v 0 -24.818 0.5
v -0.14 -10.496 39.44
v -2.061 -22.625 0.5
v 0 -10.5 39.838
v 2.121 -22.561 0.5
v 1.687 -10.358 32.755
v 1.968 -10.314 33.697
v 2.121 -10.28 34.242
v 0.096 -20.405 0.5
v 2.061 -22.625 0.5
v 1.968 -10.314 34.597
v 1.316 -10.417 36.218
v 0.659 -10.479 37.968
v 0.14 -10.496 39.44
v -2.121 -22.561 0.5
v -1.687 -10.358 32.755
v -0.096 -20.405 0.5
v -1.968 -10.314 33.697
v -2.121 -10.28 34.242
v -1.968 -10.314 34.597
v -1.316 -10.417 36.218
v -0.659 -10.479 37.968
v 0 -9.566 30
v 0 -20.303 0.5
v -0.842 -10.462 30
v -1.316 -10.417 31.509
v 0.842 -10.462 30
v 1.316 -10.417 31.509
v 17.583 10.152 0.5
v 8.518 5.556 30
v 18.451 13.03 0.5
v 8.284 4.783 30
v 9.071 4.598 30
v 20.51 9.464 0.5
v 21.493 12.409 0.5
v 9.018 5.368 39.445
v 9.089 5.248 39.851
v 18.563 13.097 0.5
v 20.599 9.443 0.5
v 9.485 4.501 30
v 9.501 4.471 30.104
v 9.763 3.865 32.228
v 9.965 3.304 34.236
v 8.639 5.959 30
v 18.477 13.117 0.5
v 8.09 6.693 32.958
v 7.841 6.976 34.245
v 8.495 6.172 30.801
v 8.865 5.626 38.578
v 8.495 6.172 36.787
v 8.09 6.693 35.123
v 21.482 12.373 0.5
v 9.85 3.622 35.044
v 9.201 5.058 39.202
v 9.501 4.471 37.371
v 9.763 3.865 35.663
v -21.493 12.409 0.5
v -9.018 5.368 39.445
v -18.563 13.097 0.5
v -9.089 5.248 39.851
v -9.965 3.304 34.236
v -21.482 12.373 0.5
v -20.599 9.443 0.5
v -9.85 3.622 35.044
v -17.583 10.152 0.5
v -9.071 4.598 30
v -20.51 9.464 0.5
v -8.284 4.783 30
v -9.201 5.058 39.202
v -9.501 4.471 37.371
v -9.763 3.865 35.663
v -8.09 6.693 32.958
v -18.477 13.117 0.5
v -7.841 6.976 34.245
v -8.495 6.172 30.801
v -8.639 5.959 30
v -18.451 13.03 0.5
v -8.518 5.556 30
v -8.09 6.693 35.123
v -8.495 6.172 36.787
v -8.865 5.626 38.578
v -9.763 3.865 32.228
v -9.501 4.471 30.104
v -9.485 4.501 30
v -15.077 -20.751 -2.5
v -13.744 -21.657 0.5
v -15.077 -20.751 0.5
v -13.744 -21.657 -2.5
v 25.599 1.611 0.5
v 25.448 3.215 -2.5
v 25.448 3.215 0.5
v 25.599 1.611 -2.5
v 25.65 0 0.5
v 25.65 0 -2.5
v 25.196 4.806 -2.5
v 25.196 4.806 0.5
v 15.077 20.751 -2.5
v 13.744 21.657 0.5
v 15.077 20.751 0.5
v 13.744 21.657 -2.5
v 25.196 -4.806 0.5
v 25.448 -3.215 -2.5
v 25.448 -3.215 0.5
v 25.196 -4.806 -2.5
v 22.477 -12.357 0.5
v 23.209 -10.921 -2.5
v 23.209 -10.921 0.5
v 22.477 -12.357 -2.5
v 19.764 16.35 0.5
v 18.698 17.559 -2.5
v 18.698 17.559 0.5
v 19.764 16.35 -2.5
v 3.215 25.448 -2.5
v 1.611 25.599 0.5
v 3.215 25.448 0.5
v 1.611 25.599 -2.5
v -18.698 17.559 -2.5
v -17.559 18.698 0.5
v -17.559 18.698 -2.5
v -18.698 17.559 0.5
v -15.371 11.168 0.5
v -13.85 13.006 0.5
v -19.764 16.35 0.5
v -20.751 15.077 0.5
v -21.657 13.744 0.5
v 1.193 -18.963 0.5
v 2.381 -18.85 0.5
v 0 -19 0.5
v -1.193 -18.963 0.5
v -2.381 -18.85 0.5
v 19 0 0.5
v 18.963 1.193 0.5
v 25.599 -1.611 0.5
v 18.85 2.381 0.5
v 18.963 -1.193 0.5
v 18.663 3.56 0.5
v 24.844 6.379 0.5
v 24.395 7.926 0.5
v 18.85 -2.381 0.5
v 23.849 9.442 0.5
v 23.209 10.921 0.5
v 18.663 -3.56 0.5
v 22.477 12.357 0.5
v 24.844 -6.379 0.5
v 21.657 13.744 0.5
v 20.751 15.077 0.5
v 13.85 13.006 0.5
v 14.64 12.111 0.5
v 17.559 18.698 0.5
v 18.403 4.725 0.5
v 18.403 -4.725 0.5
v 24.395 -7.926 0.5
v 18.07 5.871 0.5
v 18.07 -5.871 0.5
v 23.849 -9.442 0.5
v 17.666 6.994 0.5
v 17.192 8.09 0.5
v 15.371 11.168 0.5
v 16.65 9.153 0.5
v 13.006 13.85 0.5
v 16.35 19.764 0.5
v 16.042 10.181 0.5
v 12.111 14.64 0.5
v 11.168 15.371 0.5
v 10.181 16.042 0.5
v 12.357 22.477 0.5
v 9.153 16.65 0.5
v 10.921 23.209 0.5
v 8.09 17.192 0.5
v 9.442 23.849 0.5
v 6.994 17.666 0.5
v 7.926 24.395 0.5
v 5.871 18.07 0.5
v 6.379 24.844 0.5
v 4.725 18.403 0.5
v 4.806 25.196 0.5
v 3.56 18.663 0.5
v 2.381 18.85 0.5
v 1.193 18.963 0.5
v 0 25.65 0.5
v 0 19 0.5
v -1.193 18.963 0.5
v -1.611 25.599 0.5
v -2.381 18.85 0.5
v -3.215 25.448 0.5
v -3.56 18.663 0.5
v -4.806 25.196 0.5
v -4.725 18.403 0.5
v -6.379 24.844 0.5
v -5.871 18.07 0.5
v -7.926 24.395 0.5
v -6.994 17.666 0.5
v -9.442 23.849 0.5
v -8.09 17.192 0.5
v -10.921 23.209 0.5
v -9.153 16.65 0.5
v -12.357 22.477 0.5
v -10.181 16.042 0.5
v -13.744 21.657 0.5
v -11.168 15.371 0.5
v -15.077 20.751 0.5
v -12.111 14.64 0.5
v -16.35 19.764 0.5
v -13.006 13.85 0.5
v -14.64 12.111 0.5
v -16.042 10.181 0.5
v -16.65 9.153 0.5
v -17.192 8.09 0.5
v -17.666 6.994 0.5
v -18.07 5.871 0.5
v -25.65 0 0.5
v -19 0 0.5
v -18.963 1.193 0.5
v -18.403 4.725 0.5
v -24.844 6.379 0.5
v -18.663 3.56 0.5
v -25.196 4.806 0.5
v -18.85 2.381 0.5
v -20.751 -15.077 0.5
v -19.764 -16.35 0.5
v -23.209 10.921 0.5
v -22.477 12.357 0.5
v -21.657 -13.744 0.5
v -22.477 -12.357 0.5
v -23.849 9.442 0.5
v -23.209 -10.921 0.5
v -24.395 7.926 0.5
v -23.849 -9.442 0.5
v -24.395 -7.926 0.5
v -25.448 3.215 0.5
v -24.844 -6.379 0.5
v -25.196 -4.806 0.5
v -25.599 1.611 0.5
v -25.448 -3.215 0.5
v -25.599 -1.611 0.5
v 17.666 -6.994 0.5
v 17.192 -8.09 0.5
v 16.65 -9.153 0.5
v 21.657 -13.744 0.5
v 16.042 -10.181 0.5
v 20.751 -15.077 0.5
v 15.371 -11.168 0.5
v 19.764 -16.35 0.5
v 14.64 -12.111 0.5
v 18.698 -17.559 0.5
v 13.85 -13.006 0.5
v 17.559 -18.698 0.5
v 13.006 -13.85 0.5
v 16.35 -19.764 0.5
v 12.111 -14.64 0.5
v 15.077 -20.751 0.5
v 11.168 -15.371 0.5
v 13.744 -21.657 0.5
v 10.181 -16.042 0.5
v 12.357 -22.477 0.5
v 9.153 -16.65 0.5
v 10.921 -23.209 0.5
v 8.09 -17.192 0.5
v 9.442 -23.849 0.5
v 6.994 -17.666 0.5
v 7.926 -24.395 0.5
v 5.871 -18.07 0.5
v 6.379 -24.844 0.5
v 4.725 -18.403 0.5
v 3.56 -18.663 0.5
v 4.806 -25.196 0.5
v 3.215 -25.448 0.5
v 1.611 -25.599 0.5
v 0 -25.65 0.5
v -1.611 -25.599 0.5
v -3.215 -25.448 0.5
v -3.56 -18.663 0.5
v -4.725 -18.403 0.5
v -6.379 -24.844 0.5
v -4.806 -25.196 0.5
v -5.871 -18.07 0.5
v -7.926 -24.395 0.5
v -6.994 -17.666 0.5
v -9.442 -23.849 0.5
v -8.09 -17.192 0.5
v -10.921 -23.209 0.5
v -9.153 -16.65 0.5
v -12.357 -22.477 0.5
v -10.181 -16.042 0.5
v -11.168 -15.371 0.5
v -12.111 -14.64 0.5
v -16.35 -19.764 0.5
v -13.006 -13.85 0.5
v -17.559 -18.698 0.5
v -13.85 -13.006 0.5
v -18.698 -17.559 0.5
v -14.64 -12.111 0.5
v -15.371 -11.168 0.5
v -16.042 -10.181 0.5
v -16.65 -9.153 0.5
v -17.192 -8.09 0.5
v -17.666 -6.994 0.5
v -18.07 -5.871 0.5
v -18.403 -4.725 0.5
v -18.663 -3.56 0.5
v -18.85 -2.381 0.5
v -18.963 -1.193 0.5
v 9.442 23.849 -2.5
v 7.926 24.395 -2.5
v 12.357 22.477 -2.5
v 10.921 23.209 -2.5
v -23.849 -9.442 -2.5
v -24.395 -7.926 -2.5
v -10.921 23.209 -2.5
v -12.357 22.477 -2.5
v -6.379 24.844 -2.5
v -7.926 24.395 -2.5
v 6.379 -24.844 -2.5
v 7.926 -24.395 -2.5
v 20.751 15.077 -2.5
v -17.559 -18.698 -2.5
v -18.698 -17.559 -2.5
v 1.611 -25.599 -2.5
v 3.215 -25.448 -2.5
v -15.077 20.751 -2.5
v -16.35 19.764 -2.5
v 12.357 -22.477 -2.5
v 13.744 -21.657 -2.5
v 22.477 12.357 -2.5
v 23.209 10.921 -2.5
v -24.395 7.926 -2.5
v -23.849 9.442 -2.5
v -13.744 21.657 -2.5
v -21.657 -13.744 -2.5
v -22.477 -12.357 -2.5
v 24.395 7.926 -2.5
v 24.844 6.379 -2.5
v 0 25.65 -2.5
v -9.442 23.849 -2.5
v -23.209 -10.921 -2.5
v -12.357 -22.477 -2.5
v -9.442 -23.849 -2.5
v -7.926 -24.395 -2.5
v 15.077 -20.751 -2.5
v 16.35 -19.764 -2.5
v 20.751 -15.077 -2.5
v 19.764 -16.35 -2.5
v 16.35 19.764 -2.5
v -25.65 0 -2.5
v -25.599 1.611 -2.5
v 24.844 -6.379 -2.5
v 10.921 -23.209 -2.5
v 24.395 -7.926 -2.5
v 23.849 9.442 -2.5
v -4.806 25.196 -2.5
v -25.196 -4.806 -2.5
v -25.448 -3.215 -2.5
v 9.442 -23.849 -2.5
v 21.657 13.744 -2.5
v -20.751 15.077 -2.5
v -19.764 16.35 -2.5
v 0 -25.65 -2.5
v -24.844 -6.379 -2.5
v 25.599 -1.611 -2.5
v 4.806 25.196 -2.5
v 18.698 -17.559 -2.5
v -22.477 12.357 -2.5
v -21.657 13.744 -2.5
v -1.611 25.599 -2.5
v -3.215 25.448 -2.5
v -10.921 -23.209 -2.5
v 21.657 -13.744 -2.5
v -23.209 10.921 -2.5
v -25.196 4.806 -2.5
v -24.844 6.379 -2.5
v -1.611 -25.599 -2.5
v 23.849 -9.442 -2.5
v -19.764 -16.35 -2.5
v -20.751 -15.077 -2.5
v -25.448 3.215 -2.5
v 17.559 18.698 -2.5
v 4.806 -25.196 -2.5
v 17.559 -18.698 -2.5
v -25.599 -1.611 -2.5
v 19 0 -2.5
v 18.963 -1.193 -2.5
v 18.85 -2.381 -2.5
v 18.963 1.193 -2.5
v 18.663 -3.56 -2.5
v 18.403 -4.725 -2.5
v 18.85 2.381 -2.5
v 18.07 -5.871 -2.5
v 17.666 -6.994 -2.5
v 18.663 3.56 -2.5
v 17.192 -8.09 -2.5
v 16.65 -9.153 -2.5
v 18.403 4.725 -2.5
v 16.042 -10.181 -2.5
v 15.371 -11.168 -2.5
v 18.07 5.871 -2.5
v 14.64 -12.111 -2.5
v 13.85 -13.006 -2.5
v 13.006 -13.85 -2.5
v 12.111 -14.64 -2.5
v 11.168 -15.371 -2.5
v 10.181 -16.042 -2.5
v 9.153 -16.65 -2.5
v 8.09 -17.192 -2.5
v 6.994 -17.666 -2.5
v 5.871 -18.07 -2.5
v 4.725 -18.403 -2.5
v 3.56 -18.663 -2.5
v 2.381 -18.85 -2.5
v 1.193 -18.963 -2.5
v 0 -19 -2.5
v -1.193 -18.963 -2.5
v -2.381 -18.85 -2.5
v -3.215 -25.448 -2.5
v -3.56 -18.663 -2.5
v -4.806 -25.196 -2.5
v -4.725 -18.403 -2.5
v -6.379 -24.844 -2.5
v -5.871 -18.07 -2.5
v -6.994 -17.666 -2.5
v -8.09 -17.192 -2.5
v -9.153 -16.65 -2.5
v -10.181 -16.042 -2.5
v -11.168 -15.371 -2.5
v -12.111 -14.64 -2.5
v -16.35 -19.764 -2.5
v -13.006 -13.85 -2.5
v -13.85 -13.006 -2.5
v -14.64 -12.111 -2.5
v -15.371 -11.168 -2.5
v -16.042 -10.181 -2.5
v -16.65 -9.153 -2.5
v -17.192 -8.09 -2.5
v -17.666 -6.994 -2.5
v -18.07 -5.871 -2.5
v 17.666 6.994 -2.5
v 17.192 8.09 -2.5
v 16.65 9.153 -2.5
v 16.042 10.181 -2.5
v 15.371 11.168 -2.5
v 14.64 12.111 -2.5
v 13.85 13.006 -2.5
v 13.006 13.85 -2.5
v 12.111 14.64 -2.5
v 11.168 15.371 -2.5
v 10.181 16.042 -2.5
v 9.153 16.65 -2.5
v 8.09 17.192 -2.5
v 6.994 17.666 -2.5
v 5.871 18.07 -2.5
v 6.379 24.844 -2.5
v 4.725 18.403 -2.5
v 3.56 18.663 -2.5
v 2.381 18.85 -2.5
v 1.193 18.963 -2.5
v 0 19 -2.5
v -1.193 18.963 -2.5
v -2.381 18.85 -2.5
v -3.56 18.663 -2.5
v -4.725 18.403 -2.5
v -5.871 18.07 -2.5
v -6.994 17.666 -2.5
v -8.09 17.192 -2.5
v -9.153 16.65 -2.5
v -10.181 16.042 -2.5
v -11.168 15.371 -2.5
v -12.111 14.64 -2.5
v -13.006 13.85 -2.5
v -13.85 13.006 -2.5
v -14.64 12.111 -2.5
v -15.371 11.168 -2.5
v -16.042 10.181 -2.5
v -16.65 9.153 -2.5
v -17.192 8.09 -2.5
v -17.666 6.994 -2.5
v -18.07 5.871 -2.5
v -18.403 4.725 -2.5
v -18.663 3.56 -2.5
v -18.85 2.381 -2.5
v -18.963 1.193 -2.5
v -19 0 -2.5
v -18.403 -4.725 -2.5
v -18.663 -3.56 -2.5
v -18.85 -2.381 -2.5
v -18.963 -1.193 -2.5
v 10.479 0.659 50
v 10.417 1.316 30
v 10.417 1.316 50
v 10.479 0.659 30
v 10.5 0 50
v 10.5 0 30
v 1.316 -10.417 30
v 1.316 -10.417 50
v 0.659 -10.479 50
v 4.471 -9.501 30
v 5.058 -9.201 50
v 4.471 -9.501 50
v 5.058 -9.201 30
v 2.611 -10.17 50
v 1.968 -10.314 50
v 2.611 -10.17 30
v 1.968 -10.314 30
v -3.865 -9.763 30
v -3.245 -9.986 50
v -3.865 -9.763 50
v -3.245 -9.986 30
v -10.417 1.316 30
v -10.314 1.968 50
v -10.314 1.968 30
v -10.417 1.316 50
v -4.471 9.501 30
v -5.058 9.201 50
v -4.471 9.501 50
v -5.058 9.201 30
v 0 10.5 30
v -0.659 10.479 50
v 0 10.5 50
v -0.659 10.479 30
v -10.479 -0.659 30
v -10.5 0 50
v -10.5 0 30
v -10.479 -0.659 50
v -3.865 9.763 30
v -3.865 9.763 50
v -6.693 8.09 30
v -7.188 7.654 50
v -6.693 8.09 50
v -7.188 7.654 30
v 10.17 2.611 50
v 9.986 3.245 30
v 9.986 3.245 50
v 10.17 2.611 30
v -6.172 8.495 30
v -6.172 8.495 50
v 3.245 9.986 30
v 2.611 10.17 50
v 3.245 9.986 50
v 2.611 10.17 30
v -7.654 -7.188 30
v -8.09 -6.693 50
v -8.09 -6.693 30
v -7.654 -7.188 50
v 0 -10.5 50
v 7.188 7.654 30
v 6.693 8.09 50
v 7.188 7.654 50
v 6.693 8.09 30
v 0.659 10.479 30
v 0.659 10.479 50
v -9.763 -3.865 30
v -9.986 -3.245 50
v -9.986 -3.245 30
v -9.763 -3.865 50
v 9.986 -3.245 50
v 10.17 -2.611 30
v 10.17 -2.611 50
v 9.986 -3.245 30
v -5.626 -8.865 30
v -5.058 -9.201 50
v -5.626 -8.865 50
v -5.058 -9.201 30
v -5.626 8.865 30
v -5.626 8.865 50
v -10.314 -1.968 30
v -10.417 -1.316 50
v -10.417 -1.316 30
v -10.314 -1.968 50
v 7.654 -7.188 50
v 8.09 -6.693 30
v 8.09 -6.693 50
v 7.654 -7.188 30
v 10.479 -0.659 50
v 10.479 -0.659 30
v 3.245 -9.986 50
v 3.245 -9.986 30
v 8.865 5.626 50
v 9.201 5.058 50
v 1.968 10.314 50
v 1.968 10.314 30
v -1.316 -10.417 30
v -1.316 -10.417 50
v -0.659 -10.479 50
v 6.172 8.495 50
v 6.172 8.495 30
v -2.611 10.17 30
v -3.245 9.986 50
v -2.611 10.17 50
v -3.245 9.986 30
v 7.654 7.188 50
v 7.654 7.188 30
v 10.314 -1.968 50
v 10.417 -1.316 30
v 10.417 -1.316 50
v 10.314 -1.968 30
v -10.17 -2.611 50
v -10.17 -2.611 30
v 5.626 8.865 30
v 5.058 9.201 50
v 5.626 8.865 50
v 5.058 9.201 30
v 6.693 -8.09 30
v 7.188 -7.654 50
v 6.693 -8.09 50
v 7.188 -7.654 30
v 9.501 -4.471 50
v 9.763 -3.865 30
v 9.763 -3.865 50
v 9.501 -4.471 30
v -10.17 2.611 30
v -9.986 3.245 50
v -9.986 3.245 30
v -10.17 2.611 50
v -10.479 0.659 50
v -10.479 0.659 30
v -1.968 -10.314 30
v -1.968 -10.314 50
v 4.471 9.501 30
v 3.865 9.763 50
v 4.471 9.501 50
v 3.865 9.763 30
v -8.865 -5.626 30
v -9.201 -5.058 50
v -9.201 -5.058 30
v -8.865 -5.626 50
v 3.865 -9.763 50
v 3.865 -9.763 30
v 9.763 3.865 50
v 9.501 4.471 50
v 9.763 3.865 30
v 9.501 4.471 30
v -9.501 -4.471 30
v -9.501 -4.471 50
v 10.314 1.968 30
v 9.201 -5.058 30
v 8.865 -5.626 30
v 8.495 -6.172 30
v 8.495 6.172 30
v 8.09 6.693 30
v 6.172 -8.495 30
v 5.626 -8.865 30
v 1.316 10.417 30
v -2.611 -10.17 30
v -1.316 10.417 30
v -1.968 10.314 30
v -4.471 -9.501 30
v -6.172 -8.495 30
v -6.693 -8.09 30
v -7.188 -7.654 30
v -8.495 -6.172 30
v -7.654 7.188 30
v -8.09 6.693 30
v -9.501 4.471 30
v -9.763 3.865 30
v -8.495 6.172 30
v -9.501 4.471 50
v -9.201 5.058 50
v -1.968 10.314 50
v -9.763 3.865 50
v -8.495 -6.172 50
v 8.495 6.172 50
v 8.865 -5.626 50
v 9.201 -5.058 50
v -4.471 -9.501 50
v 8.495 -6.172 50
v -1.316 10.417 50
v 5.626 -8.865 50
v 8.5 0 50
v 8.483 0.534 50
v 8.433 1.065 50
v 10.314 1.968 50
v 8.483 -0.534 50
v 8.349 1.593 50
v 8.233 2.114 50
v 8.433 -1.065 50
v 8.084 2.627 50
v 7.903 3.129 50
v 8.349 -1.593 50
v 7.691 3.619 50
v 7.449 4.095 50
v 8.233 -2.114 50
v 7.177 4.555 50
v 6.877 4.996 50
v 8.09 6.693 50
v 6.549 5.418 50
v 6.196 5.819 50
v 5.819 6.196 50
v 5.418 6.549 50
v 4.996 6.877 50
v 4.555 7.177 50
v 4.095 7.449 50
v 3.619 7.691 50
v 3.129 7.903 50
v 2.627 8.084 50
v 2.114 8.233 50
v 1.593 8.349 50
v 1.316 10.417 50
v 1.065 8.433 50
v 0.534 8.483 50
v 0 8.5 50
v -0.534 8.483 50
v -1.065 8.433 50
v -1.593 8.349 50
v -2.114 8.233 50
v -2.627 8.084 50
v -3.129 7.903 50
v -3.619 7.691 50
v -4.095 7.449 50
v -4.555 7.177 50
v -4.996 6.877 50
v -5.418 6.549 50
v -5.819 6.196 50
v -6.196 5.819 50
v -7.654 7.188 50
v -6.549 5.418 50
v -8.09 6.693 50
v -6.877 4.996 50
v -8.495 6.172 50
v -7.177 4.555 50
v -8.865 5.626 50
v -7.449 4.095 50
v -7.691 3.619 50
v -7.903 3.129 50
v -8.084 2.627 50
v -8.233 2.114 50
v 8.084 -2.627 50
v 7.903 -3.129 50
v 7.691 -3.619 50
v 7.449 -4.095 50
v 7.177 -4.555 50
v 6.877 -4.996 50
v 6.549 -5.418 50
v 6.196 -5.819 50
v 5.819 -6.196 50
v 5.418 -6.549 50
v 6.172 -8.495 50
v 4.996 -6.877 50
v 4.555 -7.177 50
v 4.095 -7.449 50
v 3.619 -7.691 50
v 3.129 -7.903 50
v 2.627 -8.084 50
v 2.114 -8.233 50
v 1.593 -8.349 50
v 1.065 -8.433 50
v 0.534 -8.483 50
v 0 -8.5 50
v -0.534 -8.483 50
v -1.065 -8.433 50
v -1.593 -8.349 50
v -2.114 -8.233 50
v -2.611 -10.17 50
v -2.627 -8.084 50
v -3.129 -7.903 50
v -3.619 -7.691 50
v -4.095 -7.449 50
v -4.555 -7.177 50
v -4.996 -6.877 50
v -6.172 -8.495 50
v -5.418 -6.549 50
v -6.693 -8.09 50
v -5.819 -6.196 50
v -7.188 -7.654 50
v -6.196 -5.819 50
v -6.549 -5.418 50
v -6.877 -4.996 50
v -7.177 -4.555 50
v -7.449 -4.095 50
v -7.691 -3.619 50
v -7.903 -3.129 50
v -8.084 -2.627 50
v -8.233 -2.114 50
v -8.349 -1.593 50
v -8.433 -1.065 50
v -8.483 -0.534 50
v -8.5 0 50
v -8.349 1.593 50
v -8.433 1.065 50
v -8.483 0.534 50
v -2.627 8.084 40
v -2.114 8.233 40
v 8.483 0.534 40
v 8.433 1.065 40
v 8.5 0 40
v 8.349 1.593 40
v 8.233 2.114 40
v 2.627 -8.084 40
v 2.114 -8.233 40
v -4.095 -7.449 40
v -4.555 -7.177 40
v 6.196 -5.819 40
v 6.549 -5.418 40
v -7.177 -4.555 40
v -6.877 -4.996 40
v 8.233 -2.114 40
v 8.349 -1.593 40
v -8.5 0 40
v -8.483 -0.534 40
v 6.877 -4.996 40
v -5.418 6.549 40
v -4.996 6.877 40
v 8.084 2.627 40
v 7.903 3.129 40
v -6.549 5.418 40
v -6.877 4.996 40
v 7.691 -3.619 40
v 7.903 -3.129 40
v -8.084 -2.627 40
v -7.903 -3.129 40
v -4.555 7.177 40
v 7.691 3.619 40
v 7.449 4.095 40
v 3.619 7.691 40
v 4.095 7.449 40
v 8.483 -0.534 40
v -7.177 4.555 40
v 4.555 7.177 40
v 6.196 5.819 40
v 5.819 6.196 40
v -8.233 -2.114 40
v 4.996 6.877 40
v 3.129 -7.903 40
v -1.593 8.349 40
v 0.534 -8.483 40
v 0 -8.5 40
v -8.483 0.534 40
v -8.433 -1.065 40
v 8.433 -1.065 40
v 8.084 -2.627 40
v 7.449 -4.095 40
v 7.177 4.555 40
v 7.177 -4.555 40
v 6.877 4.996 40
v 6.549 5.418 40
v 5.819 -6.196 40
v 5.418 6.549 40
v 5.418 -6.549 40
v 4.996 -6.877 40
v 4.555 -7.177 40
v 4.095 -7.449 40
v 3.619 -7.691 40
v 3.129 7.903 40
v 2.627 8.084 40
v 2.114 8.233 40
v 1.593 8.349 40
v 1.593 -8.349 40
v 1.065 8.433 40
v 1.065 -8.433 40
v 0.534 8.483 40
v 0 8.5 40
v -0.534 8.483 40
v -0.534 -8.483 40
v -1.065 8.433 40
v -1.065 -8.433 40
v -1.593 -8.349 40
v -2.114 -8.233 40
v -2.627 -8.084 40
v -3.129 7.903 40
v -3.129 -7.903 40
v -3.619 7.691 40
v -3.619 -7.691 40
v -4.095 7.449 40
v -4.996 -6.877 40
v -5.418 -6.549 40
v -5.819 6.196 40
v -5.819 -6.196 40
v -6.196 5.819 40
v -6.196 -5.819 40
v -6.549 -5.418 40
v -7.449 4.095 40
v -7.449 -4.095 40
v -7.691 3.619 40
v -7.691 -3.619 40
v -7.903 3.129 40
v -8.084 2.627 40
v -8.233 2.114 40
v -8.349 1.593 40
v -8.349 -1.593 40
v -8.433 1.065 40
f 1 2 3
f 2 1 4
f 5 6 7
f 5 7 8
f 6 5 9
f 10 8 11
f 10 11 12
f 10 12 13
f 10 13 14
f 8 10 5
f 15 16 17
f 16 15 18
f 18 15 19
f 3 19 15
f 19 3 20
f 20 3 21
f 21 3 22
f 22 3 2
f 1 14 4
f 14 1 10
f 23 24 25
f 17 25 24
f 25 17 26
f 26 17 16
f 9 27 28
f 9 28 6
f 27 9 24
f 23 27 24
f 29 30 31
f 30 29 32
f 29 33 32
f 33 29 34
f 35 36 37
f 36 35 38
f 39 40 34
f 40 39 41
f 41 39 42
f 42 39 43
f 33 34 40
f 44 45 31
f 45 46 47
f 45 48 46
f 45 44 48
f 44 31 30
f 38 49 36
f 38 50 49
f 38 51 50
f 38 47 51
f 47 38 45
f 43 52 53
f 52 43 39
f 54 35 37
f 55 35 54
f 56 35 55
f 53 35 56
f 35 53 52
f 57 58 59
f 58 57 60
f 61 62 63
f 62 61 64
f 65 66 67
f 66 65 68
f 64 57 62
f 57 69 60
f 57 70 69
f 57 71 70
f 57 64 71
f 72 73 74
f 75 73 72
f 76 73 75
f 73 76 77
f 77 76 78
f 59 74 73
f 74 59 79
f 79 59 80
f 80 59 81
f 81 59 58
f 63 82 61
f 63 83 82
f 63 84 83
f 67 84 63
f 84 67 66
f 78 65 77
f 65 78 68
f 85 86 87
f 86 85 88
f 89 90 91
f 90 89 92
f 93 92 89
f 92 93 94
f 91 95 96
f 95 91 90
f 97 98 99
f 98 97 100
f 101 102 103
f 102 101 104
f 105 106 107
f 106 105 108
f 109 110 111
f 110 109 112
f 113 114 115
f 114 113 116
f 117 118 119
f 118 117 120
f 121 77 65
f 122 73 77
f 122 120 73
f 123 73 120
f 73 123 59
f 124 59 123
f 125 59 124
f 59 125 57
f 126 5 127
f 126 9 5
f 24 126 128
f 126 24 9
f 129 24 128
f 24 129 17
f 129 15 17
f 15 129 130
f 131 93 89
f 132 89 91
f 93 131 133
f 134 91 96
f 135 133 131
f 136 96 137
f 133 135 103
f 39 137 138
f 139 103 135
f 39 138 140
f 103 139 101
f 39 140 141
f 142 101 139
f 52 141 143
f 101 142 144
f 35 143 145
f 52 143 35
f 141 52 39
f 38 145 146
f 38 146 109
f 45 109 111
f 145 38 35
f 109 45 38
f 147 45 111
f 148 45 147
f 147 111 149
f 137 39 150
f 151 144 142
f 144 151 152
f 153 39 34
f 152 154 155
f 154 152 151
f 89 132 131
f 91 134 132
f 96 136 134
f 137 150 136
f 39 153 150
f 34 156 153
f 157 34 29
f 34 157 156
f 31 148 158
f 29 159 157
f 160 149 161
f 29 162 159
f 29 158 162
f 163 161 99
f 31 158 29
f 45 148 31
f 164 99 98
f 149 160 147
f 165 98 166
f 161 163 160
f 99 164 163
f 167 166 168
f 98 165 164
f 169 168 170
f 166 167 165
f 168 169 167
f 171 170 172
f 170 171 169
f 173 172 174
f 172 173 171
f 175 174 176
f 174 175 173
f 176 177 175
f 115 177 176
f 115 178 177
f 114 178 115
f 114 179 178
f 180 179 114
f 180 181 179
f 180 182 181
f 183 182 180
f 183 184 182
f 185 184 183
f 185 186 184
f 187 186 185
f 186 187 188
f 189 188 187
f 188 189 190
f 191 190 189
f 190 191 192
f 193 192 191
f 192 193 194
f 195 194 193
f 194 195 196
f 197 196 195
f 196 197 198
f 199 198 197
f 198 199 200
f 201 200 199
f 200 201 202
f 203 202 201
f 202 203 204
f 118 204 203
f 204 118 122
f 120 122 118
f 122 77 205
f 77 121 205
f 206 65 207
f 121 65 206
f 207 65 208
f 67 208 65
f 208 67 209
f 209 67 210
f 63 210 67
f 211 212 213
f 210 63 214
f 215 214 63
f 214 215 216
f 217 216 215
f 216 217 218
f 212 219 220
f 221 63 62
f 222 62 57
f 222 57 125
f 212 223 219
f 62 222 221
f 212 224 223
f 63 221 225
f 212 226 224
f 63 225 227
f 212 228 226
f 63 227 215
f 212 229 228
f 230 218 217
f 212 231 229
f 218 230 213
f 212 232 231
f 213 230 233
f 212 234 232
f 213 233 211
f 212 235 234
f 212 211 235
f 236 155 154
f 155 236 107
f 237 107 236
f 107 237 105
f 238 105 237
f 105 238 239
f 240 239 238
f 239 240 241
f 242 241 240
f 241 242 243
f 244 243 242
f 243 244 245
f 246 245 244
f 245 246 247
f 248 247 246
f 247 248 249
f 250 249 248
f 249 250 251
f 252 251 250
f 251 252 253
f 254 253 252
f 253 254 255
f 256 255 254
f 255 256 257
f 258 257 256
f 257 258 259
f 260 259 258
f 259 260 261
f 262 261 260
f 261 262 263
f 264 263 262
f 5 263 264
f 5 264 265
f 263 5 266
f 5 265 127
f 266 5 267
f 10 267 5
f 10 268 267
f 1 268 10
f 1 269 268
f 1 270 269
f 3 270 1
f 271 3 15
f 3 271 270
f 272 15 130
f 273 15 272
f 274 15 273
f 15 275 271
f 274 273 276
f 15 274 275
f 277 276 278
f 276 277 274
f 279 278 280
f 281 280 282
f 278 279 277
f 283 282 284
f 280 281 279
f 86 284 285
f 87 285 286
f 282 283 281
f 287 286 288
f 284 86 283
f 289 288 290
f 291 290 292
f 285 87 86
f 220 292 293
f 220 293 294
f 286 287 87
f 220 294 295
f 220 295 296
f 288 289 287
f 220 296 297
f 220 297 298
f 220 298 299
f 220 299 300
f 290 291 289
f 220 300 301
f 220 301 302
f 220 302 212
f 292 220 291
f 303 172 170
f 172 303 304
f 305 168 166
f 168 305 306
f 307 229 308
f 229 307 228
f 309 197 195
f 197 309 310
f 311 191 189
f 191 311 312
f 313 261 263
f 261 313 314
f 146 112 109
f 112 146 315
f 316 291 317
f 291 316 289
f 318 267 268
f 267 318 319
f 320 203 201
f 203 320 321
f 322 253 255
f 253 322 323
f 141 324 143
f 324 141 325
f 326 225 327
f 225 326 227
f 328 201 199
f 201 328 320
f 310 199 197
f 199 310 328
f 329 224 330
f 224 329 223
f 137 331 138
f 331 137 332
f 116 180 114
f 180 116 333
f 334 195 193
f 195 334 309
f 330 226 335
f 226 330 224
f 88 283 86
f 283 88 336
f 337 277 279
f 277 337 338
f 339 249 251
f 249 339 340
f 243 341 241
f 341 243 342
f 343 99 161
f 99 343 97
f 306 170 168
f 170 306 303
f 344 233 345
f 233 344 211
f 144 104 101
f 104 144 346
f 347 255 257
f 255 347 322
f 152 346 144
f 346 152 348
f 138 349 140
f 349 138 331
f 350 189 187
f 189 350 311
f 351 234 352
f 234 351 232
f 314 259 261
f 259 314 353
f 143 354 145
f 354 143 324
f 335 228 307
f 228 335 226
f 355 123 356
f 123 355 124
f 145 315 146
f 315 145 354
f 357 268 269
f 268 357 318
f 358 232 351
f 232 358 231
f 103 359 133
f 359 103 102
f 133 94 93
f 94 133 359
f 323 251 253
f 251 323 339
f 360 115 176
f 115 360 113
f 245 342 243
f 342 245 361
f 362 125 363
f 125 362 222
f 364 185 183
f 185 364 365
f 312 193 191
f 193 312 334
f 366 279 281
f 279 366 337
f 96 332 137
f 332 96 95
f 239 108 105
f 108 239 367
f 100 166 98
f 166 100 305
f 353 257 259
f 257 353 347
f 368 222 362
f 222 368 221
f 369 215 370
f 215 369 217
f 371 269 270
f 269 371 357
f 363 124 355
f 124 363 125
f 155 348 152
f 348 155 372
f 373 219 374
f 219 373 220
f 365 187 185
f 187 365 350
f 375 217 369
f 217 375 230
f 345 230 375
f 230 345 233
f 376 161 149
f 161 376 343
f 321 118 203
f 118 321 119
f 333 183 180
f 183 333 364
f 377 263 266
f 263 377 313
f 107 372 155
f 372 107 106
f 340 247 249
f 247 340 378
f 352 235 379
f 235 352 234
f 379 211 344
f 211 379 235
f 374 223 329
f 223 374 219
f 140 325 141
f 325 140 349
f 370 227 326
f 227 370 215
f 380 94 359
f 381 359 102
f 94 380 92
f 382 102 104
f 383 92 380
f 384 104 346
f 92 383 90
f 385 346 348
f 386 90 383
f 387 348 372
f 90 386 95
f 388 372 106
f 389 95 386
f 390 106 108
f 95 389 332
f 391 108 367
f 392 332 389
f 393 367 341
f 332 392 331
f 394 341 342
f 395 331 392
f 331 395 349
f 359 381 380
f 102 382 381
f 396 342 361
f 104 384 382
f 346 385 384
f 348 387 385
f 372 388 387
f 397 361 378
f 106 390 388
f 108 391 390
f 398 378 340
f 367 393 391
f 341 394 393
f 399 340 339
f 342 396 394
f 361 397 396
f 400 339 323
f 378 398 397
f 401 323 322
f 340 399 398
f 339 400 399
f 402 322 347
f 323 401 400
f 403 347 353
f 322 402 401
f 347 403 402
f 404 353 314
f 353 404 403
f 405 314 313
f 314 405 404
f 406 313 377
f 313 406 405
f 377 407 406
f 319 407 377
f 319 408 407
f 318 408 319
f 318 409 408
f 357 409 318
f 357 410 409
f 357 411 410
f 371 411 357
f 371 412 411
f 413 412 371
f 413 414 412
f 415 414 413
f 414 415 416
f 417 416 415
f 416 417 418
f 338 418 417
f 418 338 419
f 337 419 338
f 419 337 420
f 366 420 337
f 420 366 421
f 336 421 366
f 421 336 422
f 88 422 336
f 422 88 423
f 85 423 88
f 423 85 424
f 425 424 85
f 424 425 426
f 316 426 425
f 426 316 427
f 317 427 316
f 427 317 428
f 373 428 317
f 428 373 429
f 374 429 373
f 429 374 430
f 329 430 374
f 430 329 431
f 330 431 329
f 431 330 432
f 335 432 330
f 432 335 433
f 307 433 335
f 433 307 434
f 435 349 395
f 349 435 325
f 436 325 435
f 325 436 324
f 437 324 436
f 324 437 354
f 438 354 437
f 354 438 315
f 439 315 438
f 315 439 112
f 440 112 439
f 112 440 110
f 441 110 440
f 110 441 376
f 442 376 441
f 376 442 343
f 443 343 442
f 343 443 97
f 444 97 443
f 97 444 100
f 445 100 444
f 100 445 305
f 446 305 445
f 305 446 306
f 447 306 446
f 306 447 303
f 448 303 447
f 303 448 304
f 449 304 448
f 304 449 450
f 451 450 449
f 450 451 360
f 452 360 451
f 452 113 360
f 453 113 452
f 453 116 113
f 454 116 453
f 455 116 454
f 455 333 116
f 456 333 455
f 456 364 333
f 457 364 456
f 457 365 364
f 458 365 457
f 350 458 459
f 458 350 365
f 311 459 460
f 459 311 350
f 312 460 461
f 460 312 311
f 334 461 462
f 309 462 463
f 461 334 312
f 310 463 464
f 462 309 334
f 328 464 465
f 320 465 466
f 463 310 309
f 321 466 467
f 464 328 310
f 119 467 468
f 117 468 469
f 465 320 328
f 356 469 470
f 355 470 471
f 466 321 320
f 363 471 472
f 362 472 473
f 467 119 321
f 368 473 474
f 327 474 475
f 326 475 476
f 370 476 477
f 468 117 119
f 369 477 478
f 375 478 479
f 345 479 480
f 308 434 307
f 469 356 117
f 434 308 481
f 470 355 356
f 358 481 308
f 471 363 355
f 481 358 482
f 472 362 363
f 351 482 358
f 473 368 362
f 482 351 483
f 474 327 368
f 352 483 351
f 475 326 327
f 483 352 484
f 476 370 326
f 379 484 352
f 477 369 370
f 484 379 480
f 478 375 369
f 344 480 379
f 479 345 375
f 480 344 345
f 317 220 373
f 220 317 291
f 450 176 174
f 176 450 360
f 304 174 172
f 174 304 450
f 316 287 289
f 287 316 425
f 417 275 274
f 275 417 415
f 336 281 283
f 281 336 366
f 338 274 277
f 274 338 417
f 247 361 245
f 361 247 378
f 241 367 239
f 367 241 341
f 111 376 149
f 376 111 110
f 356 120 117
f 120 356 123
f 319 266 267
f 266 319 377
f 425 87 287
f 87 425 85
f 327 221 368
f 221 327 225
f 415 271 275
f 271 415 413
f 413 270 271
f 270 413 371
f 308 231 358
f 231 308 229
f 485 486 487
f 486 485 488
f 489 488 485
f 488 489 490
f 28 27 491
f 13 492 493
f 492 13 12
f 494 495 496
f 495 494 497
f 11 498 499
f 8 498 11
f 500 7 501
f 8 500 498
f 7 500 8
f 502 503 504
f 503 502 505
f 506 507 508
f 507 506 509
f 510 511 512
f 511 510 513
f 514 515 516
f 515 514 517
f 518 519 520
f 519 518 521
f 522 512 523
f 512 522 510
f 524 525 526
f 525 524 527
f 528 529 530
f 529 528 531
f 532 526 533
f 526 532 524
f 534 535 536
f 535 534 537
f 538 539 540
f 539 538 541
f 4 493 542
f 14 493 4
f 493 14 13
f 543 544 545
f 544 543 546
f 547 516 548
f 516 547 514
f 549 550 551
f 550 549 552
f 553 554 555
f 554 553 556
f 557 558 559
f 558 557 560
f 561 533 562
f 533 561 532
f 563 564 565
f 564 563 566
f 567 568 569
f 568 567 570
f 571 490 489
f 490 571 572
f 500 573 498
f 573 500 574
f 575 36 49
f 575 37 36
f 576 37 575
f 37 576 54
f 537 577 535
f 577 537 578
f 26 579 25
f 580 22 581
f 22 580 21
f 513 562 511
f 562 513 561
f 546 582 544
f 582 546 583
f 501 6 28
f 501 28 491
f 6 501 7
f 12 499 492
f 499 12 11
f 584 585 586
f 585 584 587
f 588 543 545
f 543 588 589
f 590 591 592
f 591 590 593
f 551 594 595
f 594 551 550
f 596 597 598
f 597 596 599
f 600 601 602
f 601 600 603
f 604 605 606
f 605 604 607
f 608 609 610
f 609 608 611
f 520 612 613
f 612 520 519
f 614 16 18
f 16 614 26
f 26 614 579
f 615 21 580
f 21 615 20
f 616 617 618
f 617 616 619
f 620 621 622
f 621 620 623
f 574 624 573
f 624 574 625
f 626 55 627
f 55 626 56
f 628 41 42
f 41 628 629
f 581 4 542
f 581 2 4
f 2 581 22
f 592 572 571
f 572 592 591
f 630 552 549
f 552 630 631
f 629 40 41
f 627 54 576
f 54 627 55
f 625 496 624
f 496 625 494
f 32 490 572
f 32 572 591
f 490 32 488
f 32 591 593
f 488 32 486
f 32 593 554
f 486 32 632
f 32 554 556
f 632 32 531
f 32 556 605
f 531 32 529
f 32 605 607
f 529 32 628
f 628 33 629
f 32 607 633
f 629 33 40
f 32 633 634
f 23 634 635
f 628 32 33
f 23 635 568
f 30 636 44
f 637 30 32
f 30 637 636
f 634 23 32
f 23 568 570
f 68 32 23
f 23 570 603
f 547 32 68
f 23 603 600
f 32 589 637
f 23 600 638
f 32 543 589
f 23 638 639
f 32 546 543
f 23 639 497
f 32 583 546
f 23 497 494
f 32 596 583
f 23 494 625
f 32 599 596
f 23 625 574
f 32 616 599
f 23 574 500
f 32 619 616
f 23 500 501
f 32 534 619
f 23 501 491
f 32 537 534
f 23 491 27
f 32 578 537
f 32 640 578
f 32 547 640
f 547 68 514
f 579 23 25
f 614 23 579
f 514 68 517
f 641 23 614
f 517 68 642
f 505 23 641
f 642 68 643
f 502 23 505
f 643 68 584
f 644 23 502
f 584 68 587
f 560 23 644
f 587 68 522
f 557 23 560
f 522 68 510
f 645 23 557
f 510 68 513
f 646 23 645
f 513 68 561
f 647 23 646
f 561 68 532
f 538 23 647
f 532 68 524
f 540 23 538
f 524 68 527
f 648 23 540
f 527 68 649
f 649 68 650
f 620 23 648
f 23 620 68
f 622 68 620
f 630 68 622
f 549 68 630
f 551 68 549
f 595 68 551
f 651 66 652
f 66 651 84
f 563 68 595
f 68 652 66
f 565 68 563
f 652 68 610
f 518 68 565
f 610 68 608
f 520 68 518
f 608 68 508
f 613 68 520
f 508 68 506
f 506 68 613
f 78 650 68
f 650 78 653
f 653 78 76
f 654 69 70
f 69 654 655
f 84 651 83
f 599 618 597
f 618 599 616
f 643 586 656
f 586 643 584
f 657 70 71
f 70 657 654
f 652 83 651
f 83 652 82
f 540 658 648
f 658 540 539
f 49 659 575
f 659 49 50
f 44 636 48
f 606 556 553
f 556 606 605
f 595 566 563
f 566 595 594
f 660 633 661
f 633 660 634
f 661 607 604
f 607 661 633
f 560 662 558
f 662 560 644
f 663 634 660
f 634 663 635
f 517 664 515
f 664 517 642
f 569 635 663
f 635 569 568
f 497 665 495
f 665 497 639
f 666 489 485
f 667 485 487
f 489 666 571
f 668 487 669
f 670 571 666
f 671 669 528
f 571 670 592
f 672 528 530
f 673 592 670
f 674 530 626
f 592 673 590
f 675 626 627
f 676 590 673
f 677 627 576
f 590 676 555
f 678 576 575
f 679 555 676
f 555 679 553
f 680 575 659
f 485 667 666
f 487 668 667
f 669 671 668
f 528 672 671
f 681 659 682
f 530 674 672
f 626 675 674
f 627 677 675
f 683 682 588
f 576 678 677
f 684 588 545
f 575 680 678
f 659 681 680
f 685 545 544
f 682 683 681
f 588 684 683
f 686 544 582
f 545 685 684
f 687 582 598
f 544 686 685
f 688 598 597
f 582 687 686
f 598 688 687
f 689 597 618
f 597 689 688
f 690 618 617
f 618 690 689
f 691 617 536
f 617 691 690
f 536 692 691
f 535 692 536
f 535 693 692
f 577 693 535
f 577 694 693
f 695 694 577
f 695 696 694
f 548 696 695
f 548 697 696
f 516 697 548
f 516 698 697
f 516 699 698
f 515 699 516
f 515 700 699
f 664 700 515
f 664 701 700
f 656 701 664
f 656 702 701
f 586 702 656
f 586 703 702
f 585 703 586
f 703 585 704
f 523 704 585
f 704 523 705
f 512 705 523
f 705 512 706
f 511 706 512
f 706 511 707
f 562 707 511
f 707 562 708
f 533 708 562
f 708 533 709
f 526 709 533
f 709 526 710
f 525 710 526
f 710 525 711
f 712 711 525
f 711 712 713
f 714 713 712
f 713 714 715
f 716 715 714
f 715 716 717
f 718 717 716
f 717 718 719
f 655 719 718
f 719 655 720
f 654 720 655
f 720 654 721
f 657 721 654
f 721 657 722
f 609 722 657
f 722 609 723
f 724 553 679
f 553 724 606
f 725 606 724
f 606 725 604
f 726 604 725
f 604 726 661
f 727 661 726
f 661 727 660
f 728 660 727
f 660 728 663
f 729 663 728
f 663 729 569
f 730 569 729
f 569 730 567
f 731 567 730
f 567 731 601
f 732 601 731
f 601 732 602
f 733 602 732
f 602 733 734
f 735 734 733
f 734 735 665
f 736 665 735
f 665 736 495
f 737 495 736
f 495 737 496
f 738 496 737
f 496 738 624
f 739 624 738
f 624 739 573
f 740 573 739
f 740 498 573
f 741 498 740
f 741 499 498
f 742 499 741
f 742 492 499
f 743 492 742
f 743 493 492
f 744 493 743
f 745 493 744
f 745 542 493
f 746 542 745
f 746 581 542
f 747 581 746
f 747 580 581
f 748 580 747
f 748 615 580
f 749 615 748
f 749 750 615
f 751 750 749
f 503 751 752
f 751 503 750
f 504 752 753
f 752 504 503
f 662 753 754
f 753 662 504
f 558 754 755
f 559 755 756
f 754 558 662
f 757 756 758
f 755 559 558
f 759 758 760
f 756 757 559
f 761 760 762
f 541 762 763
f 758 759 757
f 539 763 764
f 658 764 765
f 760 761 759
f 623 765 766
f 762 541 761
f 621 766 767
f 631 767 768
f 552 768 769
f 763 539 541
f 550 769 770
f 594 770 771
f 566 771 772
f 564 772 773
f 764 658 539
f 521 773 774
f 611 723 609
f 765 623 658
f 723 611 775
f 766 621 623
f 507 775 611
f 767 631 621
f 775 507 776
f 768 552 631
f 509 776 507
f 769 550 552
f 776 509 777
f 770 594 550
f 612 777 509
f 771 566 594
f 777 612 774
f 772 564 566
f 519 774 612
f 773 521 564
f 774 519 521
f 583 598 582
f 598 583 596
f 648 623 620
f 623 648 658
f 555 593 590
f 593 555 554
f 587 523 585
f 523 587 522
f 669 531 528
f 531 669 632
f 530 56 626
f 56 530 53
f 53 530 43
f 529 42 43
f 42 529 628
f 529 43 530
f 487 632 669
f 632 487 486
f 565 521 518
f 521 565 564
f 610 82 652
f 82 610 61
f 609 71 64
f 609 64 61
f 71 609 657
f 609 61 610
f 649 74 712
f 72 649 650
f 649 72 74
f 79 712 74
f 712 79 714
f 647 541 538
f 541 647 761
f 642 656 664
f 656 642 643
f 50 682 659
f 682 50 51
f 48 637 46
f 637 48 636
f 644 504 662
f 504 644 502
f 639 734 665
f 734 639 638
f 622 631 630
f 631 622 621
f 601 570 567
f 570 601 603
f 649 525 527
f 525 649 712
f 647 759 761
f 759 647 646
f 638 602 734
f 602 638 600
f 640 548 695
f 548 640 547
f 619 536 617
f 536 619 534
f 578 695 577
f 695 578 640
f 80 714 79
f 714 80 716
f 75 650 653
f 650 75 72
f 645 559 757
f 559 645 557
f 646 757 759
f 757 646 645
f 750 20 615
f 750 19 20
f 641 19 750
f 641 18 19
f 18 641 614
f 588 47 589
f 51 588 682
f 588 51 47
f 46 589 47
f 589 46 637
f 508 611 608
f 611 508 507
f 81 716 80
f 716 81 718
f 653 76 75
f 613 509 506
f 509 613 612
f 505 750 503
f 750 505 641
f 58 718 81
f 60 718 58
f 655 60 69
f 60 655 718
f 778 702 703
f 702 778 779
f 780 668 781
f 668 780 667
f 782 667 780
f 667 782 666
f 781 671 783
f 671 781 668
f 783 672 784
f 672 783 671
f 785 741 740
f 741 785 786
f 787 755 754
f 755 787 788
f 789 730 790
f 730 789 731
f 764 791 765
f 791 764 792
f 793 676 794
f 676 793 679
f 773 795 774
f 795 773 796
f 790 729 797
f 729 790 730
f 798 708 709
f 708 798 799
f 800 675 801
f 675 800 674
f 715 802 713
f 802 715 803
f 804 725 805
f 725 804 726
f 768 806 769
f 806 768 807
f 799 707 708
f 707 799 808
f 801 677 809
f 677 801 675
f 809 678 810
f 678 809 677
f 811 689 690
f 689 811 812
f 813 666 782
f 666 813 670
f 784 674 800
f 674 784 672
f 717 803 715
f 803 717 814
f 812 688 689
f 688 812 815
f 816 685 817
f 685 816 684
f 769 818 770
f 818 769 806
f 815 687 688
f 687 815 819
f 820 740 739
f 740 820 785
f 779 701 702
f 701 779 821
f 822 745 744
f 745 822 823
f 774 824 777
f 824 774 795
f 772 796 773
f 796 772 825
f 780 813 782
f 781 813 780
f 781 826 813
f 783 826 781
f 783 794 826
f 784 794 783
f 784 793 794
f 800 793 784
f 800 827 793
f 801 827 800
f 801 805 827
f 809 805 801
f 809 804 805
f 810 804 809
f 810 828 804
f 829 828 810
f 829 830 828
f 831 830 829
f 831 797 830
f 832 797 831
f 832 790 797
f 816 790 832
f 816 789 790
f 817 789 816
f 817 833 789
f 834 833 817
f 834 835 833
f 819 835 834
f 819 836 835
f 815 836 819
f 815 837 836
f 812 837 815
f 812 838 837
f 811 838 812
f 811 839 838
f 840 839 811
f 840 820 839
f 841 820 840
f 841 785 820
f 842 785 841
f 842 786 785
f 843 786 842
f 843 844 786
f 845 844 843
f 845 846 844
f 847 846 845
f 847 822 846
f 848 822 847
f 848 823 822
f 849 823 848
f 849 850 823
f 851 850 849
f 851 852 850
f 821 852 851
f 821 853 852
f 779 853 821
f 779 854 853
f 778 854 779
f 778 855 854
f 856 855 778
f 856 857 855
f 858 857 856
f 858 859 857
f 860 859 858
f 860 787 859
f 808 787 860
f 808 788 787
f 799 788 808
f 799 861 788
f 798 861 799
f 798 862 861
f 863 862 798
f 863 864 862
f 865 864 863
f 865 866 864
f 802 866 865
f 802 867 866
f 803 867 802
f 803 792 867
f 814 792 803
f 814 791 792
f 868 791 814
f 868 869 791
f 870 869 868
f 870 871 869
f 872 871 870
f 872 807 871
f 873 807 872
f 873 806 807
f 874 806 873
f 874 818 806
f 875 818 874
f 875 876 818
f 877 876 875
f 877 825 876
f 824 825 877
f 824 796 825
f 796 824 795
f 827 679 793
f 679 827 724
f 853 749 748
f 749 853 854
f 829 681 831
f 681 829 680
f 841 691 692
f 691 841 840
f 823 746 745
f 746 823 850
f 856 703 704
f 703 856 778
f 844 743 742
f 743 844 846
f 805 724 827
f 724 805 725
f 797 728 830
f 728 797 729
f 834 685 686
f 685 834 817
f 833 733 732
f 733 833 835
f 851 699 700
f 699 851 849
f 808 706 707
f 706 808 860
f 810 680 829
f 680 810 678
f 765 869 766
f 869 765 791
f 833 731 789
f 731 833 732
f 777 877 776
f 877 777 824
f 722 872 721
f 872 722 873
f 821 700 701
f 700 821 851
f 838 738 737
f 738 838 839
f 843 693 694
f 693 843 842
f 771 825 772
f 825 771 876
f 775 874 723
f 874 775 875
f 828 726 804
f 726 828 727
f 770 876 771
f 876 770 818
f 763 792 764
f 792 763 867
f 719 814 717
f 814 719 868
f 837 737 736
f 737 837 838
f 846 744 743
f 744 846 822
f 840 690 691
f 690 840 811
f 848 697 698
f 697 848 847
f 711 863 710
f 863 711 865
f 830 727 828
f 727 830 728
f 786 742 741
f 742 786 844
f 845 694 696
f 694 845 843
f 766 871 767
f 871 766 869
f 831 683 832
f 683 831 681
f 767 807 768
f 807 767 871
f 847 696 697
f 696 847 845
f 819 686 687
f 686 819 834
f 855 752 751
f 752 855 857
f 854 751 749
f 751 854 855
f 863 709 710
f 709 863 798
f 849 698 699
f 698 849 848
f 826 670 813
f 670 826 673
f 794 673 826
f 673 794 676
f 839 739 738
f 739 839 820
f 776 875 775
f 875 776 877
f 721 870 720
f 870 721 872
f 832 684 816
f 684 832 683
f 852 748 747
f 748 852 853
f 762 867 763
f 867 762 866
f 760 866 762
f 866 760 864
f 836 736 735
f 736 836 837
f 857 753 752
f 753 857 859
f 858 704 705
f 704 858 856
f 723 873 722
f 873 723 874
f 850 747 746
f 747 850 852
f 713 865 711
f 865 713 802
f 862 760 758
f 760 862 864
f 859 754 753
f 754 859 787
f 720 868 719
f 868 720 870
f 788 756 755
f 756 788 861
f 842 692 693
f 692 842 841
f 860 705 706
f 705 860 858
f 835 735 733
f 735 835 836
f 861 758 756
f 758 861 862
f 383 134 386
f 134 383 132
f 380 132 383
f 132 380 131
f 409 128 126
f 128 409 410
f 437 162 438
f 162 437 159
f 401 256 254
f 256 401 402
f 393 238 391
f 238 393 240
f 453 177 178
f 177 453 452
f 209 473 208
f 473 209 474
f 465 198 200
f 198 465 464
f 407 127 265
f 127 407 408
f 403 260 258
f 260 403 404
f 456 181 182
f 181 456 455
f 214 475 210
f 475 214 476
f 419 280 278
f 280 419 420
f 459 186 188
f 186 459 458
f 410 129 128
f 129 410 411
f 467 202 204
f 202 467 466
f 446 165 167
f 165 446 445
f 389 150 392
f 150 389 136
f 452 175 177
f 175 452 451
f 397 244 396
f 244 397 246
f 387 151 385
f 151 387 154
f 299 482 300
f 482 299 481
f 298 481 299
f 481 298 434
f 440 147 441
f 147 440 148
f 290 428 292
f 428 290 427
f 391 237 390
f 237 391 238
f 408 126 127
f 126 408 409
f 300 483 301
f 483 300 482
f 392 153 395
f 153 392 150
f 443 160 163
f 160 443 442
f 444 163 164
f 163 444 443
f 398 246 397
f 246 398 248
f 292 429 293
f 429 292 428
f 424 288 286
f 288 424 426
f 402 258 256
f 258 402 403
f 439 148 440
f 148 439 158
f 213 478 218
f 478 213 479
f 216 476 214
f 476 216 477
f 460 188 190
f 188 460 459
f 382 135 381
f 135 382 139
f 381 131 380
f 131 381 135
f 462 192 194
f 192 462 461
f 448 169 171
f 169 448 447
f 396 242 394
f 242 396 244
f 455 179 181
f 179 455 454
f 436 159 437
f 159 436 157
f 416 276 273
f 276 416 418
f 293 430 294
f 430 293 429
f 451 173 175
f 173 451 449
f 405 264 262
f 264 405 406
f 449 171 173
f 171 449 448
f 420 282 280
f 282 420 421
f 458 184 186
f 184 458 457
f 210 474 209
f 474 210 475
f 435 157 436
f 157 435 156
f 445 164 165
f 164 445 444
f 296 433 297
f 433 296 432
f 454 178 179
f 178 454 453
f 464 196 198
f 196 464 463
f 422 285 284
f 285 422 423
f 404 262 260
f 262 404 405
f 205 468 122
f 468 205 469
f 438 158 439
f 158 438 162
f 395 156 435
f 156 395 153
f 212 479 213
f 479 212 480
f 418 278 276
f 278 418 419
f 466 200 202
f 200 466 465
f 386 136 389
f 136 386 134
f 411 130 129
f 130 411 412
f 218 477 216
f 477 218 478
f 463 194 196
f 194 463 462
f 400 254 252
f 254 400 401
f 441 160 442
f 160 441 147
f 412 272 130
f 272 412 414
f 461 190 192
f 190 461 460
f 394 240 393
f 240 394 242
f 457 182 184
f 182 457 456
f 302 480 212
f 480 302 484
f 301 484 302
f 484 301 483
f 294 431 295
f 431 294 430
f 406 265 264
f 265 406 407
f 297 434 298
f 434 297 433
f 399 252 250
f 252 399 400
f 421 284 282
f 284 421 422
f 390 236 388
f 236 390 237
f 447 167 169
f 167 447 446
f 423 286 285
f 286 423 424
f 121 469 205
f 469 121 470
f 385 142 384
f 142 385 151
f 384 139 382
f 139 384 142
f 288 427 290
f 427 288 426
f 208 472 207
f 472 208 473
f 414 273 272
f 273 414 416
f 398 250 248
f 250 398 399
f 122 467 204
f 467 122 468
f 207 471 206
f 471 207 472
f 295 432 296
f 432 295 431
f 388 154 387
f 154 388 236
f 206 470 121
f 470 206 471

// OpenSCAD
$fn = 100; 
   
strength = 0.2;
radius_bottom = 10;
radius_top = 2;

module leg()
{
  translate([0,-25,0])
    rotate([-20,0,0])    
      rotate([0,0,45])
        cube([3,3,45]);
}

module sensor_holder()
{
  difference()
  {
    tripod();   
    
    //becher innen
    translate([0,0,40])
      cylinder(h=50,r=8.5);
    
    translate([0,0,-3])
      cylinder(h=3.6,r=19);
  } 
}

module tripod()
{
  leg();
    
  rotate([0,0,120])
    leg();
    
  rotate([0,0,240])
    leg();
  
  translate([0,0,-2.5])
    cylinder(h=3,r=25.65);
  
  // becher aussen
  translate([0,0,30])
      cylinder(h=20,r=10.5);
}


sensor_holder();
